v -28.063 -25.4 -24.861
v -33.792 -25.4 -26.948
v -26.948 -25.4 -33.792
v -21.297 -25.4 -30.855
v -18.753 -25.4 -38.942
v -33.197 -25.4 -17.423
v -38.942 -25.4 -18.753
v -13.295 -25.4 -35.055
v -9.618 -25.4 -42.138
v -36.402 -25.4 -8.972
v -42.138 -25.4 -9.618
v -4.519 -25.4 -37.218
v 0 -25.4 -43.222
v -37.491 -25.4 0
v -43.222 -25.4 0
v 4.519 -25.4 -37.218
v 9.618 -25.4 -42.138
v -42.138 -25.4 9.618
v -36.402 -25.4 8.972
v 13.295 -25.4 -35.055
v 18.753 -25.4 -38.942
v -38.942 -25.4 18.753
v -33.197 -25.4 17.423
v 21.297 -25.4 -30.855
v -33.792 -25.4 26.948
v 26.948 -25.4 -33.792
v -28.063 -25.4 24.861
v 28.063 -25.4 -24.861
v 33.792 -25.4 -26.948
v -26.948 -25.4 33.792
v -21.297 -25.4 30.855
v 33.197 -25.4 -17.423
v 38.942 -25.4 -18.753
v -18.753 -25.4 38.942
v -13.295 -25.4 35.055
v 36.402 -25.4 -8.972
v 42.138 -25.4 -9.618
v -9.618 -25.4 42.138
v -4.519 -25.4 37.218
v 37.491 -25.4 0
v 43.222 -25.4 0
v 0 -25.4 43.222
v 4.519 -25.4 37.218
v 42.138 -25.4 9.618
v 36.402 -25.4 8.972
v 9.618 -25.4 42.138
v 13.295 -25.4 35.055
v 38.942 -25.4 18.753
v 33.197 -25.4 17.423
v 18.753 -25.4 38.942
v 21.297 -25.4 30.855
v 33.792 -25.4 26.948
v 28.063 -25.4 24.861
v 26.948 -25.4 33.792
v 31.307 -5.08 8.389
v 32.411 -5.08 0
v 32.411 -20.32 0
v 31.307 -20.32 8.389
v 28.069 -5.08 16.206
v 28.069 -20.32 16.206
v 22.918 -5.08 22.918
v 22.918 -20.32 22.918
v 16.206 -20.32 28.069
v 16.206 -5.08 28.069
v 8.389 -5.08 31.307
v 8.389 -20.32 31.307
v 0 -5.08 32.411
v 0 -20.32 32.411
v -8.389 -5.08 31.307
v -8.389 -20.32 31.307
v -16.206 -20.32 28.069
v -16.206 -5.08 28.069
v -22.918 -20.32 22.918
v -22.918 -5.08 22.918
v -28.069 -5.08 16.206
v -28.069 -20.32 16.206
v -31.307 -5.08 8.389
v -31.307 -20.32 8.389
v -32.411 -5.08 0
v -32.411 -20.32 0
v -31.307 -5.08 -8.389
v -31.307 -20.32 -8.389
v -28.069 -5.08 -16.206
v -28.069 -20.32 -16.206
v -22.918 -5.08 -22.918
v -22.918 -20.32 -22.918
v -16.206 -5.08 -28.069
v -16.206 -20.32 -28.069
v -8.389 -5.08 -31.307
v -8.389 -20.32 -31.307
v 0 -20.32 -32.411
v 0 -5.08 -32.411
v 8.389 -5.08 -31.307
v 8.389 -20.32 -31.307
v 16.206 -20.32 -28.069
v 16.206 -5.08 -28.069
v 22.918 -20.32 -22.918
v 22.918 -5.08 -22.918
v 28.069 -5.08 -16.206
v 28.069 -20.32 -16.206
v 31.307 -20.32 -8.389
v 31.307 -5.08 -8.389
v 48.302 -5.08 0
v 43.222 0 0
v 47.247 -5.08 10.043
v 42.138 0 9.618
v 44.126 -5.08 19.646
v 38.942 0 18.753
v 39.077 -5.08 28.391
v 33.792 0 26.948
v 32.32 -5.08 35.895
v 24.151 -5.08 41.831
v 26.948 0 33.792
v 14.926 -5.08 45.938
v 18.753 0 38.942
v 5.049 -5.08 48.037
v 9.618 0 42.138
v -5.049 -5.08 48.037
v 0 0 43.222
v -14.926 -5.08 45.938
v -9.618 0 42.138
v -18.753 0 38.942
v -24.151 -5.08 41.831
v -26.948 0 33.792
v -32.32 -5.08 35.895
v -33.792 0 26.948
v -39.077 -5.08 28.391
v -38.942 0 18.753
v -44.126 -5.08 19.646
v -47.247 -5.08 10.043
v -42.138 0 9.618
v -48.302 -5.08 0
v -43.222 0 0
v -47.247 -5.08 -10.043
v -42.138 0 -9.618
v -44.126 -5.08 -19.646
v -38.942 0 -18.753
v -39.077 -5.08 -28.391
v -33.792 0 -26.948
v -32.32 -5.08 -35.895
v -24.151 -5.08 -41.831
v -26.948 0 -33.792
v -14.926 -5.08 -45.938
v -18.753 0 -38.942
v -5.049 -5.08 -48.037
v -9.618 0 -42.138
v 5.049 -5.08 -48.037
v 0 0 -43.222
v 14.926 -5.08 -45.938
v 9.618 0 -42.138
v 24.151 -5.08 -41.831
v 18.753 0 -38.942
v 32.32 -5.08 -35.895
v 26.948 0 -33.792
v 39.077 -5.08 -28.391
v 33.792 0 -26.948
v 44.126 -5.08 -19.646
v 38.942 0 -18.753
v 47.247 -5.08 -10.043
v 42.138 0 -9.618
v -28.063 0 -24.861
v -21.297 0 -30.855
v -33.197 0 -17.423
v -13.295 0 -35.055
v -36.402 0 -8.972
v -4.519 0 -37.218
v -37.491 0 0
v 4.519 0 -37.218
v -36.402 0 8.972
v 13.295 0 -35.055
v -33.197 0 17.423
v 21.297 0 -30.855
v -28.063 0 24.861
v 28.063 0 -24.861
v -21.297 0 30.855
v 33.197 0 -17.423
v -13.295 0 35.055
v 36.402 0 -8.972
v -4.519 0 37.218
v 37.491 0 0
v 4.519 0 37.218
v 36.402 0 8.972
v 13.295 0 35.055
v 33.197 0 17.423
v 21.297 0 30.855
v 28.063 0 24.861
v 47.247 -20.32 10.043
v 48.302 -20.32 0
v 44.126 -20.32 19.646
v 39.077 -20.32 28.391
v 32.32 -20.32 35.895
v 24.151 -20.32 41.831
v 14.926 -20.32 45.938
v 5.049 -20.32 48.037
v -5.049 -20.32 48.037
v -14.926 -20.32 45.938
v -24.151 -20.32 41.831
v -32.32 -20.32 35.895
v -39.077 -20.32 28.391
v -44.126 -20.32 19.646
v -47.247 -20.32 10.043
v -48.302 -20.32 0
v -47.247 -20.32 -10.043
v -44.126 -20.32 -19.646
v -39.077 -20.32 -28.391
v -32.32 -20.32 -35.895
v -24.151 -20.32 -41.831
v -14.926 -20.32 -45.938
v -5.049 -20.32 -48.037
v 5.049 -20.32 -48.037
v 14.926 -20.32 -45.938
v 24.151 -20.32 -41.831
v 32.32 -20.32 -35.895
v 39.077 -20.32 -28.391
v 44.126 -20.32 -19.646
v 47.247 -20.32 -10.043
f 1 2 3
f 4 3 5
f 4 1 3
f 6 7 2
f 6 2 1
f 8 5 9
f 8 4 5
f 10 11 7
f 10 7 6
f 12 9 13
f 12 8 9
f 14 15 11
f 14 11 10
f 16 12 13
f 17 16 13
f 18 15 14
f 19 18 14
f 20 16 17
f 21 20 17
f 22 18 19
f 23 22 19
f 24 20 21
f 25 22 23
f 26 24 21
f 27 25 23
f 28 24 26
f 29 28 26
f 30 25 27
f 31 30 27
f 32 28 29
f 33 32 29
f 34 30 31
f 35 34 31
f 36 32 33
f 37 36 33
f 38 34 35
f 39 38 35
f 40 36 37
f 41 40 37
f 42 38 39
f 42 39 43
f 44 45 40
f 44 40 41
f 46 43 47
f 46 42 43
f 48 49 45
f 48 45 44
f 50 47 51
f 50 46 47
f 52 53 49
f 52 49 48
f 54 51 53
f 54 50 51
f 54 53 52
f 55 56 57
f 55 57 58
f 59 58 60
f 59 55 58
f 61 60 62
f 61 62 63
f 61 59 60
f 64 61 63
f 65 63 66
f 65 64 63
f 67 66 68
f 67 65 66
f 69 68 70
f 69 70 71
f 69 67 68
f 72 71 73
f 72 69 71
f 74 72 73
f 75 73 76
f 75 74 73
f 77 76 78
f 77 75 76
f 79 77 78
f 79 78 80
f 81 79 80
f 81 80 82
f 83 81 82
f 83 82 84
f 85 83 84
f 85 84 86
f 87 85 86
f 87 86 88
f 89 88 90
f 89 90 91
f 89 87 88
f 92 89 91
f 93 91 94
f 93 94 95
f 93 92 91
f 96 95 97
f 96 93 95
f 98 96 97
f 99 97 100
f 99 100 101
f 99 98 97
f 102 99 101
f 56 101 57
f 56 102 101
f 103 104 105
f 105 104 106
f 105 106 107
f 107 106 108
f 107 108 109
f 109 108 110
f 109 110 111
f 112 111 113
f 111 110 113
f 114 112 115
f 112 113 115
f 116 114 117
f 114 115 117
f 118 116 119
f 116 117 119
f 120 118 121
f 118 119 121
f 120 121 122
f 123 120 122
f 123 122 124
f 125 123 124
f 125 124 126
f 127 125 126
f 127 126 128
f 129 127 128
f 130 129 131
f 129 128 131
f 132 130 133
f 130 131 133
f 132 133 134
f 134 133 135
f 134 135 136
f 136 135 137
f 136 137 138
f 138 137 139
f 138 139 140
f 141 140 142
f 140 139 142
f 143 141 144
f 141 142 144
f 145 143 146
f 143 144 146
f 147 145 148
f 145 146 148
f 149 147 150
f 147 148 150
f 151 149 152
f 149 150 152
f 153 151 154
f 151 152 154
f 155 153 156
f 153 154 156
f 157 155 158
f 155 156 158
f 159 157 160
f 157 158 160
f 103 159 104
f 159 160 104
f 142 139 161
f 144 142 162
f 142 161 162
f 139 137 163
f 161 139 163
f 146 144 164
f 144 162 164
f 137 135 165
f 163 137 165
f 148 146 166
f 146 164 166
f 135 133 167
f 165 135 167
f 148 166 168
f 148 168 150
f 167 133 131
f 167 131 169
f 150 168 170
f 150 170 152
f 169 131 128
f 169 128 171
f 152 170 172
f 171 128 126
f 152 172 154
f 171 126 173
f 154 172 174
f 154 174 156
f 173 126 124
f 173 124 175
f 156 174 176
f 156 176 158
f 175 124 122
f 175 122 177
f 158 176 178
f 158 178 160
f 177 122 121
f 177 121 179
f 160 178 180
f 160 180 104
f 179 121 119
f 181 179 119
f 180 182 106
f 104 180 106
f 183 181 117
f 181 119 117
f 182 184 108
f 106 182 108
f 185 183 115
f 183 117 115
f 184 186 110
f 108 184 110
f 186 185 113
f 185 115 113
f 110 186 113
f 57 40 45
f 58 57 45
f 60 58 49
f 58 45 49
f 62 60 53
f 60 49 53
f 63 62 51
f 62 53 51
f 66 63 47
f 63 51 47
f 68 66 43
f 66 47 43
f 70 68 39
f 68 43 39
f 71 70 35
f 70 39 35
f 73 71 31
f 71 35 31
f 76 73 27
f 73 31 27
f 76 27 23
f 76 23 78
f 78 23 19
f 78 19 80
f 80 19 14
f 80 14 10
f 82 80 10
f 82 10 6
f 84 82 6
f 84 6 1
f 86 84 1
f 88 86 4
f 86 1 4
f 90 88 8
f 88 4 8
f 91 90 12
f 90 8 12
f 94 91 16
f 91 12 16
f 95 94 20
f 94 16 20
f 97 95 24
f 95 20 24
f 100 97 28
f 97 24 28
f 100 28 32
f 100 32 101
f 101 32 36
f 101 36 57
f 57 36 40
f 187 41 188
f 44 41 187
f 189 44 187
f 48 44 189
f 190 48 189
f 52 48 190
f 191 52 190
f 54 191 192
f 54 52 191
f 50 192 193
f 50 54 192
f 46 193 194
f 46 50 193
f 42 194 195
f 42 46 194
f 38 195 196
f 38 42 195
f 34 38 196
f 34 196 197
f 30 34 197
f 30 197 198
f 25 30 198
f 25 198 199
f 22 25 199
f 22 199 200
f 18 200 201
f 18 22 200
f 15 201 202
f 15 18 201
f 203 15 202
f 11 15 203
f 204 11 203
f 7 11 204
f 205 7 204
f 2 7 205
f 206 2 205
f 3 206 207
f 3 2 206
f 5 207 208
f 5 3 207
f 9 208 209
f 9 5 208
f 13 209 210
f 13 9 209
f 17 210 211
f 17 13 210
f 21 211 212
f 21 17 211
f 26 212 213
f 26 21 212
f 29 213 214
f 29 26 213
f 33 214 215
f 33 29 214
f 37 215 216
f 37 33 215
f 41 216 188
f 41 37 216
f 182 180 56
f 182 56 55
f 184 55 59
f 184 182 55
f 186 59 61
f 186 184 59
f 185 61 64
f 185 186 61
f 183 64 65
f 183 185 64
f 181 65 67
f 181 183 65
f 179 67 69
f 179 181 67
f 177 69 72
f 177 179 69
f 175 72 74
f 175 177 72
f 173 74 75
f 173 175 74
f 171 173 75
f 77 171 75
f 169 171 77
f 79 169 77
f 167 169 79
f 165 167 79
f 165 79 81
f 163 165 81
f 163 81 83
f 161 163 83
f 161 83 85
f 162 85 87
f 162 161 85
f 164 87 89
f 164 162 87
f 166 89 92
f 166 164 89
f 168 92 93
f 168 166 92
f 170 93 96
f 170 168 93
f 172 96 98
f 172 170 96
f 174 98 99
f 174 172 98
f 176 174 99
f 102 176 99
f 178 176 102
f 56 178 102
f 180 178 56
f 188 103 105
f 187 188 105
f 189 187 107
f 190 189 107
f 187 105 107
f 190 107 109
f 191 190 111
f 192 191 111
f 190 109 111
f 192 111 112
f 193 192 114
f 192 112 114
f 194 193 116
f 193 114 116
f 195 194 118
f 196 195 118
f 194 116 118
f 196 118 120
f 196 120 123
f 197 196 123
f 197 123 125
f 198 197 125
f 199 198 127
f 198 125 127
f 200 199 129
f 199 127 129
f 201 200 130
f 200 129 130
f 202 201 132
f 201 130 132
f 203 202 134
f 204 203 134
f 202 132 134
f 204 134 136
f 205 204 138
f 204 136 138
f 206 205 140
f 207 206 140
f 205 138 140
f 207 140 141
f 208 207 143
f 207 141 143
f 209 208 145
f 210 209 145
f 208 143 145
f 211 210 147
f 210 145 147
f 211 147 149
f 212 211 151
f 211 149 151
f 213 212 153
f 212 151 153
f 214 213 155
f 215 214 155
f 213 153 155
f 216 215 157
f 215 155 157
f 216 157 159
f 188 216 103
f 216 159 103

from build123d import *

# Parameters (mm, degrees)
F0_R     = 48.302037
F0_R_2   = 32.411145
F1_DEPTH = 25.4
F2_SIZE  = 5.08


with BuildPart() as f1:
    # F0 (on Front) → F1 (new body)
    with BuildSketch(Plane.XZ):
        Circle(F0_R)
        Circle(F0_R_2, mode=Mode.SUBTRACT)
    extrude(amount=F1_DEPTH)

    # F2
    f2_edges = [f1.edges().sort_by_distance(p)[0] for p in [
        (-48.302037, -25.4, 0),
        (-48.302037, 0, 0),
        (-32.411145, 0, 0),
        (32.411145, -12.7, 0),
        (-32.411145, -25.4, 0),
    ]]
    chamfer(f2_edges, length=F2_SIZE)


solid = f1.part
